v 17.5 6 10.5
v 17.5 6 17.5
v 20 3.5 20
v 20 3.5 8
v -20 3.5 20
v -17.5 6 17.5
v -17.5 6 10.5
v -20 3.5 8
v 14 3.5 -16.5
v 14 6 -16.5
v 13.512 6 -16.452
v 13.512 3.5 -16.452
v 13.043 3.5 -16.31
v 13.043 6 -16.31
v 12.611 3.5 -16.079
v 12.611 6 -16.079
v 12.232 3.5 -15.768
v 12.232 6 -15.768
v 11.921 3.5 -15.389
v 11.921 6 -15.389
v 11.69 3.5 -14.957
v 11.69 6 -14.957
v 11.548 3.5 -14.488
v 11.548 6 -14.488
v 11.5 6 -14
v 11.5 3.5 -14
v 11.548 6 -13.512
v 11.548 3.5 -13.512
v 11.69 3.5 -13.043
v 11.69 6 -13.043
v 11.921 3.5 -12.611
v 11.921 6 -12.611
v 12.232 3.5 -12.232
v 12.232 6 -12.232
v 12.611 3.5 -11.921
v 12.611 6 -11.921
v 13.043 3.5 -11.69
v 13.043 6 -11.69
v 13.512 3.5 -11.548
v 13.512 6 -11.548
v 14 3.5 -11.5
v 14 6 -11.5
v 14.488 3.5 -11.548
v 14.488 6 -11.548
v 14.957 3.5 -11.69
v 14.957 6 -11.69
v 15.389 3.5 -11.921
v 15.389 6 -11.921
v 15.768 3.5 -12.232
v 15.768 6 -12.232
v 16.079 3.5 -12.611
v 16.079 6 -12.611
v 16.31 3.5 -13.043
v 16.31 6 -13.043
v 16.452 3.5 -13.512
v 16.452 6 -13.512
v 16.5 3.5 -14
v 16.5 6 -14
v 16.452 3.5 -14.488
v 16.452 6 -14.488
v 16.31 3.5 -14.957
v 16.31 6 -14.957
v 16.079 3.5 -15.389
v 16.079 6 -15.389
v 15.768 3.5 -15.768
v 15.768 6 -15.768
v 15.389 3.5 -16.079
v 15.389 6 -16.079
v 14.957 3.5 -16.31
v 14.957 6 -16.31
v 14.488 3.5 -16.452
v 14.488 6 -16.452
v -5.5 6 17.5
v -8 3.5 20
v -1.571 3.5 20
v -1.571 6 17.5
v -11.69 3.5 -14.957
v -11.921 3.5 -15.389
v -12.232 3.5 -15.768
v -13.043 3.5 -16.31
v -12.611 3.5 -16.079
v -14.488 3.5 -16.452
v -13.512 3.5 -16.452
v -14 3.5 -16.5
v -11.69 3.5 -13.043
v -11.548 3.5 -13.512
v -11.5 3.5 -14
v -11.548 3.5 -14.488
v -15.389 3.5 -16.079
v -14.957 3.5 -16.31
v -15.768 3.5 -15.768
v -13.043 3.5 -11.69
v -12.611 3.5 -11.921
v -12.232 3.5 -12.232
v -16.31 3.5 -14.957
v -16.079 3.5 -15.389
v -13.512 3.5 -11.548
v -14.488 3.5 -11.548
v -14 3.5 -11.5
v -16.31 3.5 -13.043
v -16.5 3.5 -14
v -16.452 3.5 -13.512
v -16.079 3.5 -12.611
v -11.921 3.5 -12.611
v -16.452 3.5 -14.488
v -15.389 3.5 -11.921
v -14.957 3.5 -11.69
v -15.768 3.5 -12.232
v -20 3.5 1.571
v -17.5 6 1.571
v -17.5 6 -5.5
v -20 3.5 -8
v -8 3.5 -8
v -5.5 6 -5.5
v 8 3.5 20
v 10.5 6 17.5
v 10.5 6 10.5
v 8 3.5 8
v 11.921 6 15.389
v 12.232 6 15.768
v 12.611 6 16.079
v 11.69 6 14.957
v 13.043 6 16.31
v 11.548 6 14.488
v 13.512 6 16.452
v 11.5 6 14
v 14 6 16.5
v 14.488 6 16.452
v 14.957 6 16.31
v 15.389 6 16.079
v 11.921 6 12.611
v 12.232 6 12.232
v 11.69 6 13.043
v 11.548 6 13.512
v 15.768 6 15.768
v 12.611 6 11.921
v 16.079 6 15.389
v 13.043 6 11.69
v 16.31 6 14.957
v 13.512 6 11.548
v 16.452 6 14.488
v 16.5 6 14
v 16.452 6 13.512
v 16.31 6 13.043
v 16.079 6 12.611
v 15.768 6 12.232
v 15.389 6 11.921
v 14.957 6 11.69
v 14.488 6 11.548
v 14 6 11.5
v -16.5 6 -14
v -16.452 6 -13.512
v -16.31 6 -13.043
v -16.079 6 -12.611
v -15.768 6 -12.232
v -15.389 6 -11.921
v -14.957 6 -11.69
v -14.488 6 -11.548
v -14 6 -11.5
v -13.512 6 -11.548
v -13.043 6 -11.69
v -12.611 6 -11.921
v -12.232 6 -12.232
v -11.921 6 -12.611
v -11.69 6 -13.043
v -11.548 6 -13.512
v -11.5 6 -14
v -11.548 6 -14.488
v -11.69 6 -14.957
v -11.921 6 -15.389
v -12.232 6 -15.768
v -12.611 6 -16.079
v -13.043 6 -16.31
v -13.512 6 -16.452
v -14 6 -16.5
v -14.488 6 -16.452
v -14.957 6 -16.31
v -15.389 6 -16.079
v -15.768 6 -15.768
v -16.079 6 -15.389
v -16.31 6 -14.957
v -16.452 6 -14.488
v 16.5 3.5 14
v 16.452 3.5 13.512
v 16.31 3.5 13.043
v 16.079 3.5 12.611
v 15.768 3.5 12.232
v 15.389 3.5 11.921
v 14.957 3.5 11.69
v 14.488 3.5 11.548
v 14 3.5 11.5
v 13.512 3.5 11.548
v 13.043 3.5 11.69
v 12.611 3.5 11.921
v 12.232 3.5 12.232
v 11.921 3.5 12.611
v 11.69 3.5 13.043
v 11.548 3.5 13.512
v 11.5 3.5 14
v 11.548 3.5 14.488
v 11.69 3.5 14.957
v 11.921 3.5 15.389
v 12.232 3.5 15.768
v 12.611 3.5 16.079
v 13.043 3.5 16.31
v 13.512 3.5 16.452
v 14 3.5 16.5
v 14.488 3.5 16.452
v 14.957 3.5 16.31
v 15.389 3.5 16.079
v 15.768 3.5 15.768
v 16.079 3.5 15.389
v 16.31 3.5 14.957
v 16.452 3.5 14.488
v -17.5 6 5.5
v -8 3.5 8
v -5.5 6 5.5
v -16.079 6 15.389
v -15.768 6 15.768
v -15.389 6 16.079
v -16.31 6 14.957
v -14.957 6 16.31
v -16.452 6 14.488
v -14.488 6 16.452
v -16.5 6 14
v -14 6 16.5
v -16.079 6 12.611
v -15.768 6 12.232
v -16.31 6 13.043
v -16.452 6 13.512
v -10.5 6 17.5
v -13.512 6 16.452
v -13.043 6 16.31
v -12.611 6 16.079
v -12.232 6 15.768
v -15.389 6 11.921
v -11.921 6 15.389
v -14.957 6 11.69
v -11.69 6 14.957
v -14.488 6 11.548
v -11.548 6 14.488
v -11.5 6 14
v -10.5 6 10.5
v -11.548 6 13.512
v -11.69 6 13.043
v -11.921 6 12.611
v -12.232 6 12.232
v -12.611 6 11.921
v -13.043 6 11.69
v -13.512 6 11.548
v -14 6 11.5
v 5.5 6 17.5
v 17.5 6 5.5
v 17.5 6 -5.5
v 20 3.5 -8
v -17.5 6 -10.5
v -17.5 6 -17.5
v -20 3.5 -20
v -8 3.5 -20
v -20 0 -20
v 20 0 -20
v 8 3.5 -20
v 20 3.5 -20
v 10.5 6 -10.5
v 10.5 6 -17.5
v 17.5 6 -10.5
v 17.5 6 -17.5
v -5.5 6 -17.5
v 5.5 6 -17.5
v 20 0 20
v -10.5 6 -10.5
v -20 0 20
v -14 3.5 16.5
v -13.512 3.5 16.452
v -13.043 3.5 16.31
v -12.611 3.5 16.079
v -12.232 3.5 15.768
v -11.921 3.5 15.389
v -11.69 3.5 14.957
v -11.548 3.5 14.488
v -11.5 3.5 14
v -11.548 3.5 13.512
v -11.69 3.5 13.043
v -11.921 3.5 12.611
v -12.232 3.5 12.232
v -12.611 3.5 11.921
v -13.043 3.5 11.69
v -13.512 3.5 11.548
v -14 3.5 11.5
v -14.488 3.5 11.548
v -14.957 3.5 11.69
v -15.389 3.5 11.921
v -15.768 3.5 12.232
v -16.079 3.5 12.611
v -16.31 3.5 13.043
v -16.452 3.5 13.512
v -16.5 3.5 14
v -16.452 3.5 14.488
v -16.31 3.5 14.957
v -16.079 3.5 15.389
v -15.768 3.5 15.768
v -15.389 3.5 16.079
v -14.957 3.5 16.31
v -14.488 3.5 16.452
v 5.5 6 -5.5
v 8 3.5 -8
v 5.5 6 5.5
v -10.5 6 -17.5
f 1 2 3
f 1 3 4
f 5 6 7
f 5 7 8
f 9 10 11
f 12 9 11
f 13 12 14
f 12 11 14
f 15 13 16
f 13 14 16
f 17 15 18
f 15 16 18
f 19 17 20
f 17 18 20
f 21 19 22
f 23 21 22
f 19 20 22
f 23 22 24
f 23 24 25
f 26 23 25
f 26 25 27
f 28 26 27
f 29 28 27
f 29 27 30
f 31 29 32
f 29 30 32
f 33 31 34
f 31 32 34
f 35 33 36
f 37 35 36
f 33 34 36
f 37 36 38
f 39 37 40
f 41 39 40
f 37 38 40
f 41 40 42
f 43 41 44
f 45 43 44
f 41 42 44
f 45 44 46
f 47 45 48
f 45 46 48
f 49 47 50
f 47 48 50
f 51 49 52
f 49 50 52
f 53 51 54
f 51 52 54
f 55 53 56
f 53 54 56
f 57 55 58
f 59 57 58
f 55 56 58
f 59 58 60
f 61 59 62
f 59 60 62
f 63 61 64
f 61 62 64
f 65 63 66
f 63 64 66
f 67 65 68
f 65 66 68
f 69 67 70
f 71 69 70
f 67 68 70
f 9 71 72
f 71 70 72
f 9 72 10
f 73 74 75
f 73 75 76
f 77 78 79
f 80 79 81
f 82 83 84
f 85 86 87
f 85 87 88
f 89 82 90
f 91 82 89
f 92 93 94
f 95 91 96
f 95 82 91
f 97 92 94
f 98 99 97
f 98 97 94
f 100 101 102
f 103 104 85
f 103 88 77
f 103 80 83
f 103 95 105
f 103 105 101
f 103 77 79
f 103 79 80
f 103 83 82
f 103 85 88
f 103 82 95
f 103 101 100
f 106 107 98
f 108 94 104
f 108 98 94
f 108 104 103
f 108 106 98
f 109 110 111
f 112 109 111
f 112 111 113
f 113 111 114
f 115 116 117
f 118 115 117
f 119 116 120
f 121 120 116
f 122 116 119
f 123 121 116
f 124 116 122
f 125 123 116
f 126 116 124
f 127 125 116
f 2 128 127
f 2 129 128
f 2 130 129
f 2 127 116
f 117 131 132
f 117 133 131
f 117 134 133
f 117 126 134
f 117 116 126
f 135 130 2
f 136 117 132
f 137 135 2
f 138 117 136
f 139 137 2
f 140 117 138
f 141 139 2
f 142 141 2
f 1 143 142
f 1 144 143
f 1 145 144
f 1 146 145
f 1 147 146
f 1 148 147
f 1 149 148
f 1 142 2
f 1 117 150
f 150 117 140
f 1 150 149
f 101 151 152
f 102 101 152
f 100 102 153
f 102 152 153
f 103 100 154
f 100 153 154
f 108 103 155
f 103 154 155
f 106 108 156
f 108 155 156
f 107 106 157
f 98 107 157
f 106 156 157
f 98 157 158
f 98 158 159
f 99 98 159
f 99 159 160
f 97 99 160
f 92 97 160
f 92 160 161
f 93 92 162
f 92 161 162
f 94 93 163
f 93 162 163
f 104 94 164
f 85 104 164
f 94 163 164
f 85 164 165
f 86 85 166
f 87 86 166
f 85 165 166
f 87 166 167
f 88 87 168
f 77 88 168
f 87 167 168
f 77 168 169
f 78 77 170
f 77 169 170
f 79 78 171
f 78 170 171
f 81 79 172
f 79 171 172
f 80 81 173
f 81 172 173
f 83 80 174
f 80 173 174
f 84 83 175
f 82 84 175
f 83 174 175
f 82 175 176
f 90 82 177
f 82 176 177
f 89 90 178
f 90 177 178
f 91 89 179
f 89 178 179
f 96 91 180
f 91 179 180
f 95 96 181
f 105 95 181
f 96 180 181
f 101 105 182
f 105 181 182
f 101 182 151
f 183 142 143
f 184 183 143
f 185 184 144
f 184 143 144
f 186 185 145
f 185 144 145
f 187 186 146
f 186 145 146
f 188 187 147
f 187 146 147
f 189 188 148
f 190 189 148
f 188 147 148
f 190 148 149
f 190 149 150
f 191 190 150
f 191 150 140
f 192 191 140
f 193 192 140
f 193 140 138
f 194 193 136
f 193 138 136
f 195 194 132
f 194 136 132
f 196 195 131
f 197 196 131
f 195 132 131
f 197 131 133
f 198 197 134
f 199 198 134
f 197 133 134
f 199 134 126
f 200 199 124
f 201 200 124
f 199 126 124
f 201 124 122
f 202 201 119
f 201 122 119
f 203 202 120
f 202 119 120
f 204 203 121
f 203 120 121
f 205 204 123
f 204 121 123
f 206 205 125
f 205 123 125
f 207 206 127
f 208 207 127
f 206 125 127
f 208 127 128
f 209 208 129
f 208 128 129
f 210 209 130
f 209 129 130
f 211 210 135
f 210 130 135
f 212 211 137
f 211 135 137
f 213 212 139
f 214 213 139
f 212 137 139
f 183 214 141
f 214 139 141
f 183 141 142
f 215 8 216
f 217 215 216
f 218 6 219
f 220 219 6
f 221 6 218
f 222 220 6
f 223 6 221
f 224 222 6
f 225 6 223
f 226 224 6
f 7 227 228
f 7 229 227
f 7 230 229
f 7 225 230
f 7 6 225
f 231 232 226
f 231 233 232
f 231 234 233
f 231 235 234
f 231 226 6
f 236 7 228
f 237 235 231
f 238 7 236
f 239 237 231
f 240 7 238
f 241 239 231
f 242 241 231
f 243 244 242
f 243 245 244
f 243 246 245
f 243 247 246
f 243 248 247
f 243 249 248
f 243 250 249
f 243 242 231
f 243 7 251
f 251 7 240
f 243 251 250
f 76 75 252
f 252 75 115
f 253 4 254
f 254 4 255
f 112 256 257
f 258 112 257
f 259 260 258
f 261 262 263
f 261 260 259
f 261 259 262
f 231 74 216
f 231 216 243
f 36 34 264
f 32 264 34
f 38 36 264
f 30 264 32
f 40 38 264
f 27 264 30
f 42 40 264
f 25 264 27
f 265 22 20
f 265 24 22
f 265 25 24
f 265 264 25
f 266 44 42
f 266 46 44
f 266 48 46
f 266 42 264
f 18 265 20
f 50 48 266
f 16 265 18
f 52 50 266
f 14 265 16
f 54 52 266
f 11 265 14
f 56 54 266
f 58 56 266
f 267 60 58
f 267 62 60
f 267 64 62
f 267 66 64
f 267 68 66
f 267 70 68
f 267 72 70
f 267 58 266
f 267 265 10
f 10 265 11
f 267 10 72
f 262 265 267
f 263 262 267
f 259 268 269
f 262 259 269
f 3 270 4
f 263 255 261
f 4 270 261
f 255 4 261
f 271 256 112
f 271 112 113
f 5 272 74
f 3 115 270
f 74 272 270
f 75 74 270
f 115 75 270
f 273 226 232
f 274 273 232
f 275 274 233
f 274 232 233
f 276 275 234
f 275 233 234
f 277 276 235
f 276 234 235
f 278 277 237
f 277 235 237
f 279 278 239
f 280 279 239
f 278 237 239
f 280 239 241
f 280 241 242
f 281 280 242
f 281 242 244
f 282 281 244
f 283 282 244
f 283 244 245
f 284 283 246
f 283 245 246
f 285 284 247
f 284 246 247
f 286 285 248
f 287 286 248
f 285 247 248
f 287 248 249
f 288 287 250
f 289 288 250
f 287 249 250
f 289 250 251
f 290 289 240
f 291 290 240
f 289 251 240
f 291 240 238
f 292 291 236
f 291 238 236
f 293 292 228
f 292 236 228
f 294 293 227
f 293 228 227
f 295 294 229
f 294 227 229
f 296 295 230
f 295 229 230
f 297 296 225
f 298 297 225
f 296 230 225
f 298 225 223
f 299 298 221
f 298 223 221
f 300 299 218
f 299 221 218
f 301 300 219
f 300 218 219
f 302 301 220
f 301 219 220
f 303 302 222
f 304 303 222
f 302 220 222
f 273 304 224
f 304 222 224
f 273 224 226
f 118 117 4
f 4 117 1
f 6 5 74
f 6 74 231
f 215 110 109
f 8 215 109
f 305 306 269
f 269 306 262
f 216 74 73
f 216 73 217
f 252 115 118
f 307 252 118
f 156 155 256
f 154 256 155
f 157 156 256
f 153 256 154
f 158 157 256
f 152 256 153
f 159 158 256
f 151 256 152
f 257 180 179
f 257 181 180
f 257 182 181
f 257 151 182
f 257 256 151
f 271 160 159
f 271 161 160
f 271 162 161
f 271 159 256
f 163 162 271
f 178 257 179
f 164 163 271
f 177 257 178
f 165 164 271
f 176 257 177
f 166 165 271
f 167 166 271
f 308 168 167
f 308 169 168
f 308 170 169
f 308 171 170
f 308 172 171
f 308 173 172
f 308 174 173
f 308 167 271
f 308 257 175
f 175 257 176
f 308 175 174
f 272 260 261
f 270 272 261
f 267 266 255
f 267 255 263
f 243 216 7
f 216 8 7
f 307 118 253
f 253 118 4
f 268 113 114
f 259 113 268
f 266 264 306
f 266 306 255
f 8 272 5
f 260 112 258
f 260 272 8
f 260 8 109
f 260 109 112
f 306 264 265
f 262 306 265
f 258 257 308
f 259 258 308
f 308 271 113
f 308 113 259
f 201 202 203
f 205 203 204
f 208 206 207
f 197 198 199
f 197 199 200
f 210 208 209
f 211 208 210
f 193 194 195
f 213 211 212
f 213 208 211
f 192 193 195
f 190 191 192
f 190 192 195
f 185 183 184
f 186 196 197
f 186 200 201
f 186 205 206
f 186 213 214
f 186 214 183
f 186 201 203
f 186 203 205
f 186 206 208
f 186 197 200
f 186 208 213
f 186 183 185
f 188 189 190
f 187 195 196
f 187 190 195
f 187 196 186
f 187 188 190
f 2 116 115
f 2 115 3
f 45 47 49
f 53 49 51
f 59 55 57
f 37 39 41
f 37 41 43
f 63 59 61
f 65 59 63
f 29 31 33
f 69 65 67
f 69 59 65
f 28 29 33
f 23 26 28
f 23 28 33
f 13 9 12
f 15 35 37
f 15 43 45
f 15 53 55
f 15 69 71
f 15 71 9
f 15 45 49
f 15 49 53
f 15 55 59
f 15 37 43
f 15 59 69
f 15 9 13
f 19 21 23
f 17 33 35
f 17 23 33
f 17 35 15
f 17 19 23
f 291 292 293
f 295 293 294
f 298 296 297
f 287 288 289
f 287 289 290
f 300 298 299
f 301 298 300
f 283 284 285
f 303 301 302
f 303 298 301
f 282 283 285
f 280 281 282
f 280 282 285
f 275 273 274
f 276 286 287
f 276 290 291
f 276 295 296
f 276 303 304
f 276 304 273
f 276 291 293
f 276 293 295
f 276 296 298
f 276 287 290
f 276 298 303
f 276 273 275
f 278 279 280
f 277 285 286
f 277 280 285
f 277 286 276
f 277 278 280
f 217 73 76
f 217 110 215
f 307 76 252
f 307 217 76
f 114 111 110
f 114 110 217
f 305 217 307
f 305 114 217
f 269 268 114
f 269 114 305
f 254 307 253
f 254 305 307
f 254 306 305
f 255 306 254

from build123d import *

# Parameters (mm, degrees)
SKETCH1_W               = 40
SKETCH1_H               = 40
BOSS_EXTRUDE1_DEPTH     = 6
SKETCH2_W               = 12
SKETCH2_H               = 12
CUT_EXTRUDE1_DEPTH      = 2.5
CHAMFER1_SIZE           = 2.5
SKETCH3_W               = 12
SKETCH3_H               = 12
BOSS_EXTRUDE2_DEPTH     = 2.5
CHAMFER2_SIZE           = 2.5
CIRPATTERN1_OUTLINE_W   = 7
CIRPATTERN1_OUTLINE_H   = 7
CIRPATTERN1_DEPTH       = 2.5
CIRPATTERN1_DRAFT       = 45
CIRPATTERN1_2_OUTLINE_W = 7
CIRPATTERN1_2_OUTLINE_H = 7
CIRPATTERN1_2_DEPTH     = 2.5
CIRPATTERN1_2_DRAFT     = 45
CIRPATTERN1_3_OUTLINE_W = 7
CIRPATTERN1_3_OUTLINE_H = 7
CIRPATTERN1_3_DEPTH     = 2.5
CIRPATTERN1_3_DRAFT     = 45
SKETCH4_R               = 2.5
CUT_EXTRUDE2_DEPTH      = 2.5
CIRPATTERN2_COUNT       = 4


# Read off the part's stored shape, not the designer's step: CirPattern1
# Some blends are built 0.0001 mm under size
with BuildPart() as part:
    # Sketch1 → Boss-Extrude1 (new body)
    with BuildSketch(Plane(origin=(0, 0, 0), x_dir=(1, 0, 0), z_dir=(0, 1, 0))):
        Rectangle(SKETCH1_W, SKETCH1_H)
    extrude(amount=BOSS_EXTRUDE1_DEPTH)

    # Sketch2 → Cut-Extrude1 (cut)
    with BuildSketch(Plane(origin=(0, 6, 0), x_dir=(1, 0, 0), z_dir=(0, 1, 0))):
        with Locations((14, 14)):
            Rectangle(SKETCH2_W, SKETCH2_H)
        with Locations((-14, 14)):
            Rectangle(SKETCH2_W, SKETCH2_H)
        with Locations((14, -14)):
            Rectangle(SKETCH2_W, SKETCH2_H)
        with Locations((-14, -14)):
            Rectangle(SKETCH2_W, SKETCH2_H)
    extrude(amount=-CUT_EXTRUDE1_DEPTH, mode=Mode.SUBTRACT)

    # Chamfer1
    chamfer1_edges = [part.edges().sort_by_distance(p)[0] for p in [
        (-20, 6, 0),
        (-14, 6, -8),
        (-8, 6, -14),
        (0, 6, -20),
        (8, 6, -14),
        (14, 6, -8),
        (20, 6, 0),
        (14, 6, 8),
        (8, 6, 14),
        (0, 6, 20),
        (-8, 6, 14),
        (-14, 6, 8),
    ]]
    chamfer(chamfer1_edges, length=CHAMFER1_SIZE - 0.0001)  # a hair under: the kernel refuses the full size

    # Sketch3 → Boss-Extrude2 (add)
    with BuildSketch(Plane(origin=(0, 3.5, 0), x_dir=(1, 0, 0), z_dir=(0, 1, 0))):
        with Locations((-14, -14)):
            Rectangle(SKETCH3_W, SKETCH3_H)
    extrude(amount=BOSS_EXTRUDE2_DEPTH)

    # Chamfer2
    # the kernel refuses this chamfer: 2.5 mm, written as the material it takes off along each edge
    with BuildSketch(Plane(origin=(-26.42920747, 6, 8), x_dir=(0, -0.9996219169112968, -0.027495876610586317), z_dir=(1, 0, 0)), Plane(origin=(-8, 6, 8), x_dir=(0.027495876610586317, -0.9996219169112968, 0), z_dir=(0, 0, 1))) as chamfer2_piece_1:
        Polygon((CHAMFER2_SIZE * 0.999621916911, -CHAMFER2_SIZE * 0.0274958766106), (-CHAMFER2_SIZE * 0.0274958766106, -CHAMFER2_SIZE * 0.999621916911), (0, 0), align=None)
    extrude(amount=18.42920747, mode=Mode.SUBTRACT)
    with BuildSketch(Plane(origin=(-1.57079253, 6, 20), x_dir=(0, -0.9996219169112968, 0.027495876610586317), z_dir=(-1, 0, 0))) as chamfer2_piece_2:
        Polygon((CHAMFER2_SIZE * 0.999621916911, -CHAMFER2_SIZE * 0.0274958766106), (-CHAMFER2_SIZE * 0.0274958766106, -CHAMFER2_SIZE * 0.999621916911), (0, 0), align=None)
    extrude(amount=24.85841494, mode=Mode.SUBTRACT)
    with BuildSketch(Plane(origin=(-20, 6, 26.42920747), x_dir=(0.9996219169112968, 0.027495876610586317, 0), z_dir=(0, 0, -1))) as chamfer2_piece_3:
        Polygon((CHAMFER2_SIZE * 0.999621916911, CHAMFER2_SIZE * 0.0274958766106), (-CHAMFER2_SIZE * 0.0274958766106, CHAMFER2_SIZE * 0.999621916911), (0, 0), align=None)
    extrude(amount=24.85841494, mode=Mode.SUBTRACT)


with BuildPart() as cirpattern1_tool:
    # CirPattern1 outline → CirPattern1 (with draft: the straight prism first)
    with BuildSketch(Plane(origin=(0, 6, 0), x_dir=(1, 0, 0), z_dir=(0, 1, 0))):
        with Locations((14, -14)):
            Rectangle(CIRPATTERN1_OUTLINE_W, CIRPATTERN1_OUTLINE_H)
    extrude(amount=-CIRPATTERN1_DEPTH)
    # CirPattern1: the draft: its side faces are tilted about the plane it starts from
    cirpattern1_sides = [cirpattern1_tool.faces().sort_by_distance(p)[0] for p in [
        (14, 4.75, 10.5),
        (10.5, 4.75, 14),
        (14, 4.75, 17.5),
        (17.5, 4.75, 14),
    ]]
    draft(cirpattern1_sides, Plane(origin=(0, 6, 0), x_dir=(1, 0, 0), z_dir=(0, 1, 0)), CIRPATTERN1_DRAFT)


with BuildPart() as part_1:
    add(part.part)

    # CirPattern1: add cirpattern1_tool
    add(cirpattern1_tool.part)


with BuildPart() as cirpattern1_2_tool:
    # CirPattern1 2 outline → CirPattern1 2 (with draft: the straight prism first)
    with BuildSketch(Plane(origin=(0, 6, 0), x_dir=(1, 0, 0), z_dir=(0, 1, 0))):
        with Locations((14, 14)):
            Rectangle(CIRPATTERN1_2_OUTLINE_W, CIRPATTERN1_2_OUTLINE_H)
    extrude(amount=-CIRPATTERN1_2_DEPTH)
    # CirPattern1 2: the draft: its side faces are tilted about the plane it starts from
    cirpattern1_2_sides = [cirpattern1_2_tool.faces().sort_by_distance(p)[0] for p in [
        (10.5, 4.75, -14),
        (14, 4.75, -10.5),
        (17.5, 4.75, -14),
        (14, 4.75, -17.5),
    ]]
    draft(cirpattern1_2_sides, Plane(origin=(0, 6, 0), x_dir=(1, 0, 0), z_dir=(0, 1, 0)), CIRPATTERN1_2_DRAFT)


with BuildPart() as part_2:
    add(part_1.part)

    # CirPattern1 2: add cirpattern1_2_tool
    add(cirpattern1_2_tool.part)


with BuildPart() as cirpattern1_3_tool:
    # CirPattern1 3 outline → CirPattern1 3 (with draft: the straight prism first)
    with BuildSketch(Plane(origin=(0, 6, 0), x_dir=(1, 0, 0), z_dir=(0, 1, 0))):
        with Locations((-14, 14)):
            Rectangle(CIRPATTERN1_3_OUTLINE_W, CIRPATTERN1_3_OUTLINE_H)
    extrude(amount=-CIRPATTERN1_3_DEPTH)
    # CirPattern1 3: the draft: its side faces are tilted about the plane it starts from
    cirpattern1_3_sides = [cirpattern1_3_tool.faces().sort_by_distance(p)[0] for p in [
        (-14, 4.75, -10.5),
        (-10.5, 4.75, -14),
        (-14, 4.75, -17.5),
        (-17.5, 4.75, -14),
    ]]
    draft(cirpattern1_3_sides, Plane(origin=(0, 6, 0), x_dir=(1, 0, 0), z_dir=(0, 1, 0)), CIRPATTERN1_3_DRAFT)


with BuildPart() as part_3:
    add(part_2.part)

    # CirPattern1 3: add cirpattern1_3_tool
    add(cirpattern1_3_tool.part)

    # Sketch4 → Cut-Extrude2 (cut)
    with BuildSketch(Plane(origin=(0, 6, 0), x_dir=(1, 0, 0), z_dir=(0, 1, 0))):
        with Locations(Location((-14, -14, 0), (0, 0, 270))):
            Circle(SKETCH4_R)
    cut_extrude2 = extrude(amount=-CUT_EXTRUDE2_DEPTH, mode=Mode.SUBTRACT)

    # CirPattern2: Cut-Extrude2 ×4 about axis
    cirpattern2_axis = Axis((0, 0, 0), (0, 1, 0))
    for i in range(1, CIRPATTERN2_COUNT):
        add(cut_extrude2.rotate(cirpattern2_axis, i * 360 / CIRPATTERN2_COUNT), mode=Mode.SUBTRACT)


solid = part_3.part
